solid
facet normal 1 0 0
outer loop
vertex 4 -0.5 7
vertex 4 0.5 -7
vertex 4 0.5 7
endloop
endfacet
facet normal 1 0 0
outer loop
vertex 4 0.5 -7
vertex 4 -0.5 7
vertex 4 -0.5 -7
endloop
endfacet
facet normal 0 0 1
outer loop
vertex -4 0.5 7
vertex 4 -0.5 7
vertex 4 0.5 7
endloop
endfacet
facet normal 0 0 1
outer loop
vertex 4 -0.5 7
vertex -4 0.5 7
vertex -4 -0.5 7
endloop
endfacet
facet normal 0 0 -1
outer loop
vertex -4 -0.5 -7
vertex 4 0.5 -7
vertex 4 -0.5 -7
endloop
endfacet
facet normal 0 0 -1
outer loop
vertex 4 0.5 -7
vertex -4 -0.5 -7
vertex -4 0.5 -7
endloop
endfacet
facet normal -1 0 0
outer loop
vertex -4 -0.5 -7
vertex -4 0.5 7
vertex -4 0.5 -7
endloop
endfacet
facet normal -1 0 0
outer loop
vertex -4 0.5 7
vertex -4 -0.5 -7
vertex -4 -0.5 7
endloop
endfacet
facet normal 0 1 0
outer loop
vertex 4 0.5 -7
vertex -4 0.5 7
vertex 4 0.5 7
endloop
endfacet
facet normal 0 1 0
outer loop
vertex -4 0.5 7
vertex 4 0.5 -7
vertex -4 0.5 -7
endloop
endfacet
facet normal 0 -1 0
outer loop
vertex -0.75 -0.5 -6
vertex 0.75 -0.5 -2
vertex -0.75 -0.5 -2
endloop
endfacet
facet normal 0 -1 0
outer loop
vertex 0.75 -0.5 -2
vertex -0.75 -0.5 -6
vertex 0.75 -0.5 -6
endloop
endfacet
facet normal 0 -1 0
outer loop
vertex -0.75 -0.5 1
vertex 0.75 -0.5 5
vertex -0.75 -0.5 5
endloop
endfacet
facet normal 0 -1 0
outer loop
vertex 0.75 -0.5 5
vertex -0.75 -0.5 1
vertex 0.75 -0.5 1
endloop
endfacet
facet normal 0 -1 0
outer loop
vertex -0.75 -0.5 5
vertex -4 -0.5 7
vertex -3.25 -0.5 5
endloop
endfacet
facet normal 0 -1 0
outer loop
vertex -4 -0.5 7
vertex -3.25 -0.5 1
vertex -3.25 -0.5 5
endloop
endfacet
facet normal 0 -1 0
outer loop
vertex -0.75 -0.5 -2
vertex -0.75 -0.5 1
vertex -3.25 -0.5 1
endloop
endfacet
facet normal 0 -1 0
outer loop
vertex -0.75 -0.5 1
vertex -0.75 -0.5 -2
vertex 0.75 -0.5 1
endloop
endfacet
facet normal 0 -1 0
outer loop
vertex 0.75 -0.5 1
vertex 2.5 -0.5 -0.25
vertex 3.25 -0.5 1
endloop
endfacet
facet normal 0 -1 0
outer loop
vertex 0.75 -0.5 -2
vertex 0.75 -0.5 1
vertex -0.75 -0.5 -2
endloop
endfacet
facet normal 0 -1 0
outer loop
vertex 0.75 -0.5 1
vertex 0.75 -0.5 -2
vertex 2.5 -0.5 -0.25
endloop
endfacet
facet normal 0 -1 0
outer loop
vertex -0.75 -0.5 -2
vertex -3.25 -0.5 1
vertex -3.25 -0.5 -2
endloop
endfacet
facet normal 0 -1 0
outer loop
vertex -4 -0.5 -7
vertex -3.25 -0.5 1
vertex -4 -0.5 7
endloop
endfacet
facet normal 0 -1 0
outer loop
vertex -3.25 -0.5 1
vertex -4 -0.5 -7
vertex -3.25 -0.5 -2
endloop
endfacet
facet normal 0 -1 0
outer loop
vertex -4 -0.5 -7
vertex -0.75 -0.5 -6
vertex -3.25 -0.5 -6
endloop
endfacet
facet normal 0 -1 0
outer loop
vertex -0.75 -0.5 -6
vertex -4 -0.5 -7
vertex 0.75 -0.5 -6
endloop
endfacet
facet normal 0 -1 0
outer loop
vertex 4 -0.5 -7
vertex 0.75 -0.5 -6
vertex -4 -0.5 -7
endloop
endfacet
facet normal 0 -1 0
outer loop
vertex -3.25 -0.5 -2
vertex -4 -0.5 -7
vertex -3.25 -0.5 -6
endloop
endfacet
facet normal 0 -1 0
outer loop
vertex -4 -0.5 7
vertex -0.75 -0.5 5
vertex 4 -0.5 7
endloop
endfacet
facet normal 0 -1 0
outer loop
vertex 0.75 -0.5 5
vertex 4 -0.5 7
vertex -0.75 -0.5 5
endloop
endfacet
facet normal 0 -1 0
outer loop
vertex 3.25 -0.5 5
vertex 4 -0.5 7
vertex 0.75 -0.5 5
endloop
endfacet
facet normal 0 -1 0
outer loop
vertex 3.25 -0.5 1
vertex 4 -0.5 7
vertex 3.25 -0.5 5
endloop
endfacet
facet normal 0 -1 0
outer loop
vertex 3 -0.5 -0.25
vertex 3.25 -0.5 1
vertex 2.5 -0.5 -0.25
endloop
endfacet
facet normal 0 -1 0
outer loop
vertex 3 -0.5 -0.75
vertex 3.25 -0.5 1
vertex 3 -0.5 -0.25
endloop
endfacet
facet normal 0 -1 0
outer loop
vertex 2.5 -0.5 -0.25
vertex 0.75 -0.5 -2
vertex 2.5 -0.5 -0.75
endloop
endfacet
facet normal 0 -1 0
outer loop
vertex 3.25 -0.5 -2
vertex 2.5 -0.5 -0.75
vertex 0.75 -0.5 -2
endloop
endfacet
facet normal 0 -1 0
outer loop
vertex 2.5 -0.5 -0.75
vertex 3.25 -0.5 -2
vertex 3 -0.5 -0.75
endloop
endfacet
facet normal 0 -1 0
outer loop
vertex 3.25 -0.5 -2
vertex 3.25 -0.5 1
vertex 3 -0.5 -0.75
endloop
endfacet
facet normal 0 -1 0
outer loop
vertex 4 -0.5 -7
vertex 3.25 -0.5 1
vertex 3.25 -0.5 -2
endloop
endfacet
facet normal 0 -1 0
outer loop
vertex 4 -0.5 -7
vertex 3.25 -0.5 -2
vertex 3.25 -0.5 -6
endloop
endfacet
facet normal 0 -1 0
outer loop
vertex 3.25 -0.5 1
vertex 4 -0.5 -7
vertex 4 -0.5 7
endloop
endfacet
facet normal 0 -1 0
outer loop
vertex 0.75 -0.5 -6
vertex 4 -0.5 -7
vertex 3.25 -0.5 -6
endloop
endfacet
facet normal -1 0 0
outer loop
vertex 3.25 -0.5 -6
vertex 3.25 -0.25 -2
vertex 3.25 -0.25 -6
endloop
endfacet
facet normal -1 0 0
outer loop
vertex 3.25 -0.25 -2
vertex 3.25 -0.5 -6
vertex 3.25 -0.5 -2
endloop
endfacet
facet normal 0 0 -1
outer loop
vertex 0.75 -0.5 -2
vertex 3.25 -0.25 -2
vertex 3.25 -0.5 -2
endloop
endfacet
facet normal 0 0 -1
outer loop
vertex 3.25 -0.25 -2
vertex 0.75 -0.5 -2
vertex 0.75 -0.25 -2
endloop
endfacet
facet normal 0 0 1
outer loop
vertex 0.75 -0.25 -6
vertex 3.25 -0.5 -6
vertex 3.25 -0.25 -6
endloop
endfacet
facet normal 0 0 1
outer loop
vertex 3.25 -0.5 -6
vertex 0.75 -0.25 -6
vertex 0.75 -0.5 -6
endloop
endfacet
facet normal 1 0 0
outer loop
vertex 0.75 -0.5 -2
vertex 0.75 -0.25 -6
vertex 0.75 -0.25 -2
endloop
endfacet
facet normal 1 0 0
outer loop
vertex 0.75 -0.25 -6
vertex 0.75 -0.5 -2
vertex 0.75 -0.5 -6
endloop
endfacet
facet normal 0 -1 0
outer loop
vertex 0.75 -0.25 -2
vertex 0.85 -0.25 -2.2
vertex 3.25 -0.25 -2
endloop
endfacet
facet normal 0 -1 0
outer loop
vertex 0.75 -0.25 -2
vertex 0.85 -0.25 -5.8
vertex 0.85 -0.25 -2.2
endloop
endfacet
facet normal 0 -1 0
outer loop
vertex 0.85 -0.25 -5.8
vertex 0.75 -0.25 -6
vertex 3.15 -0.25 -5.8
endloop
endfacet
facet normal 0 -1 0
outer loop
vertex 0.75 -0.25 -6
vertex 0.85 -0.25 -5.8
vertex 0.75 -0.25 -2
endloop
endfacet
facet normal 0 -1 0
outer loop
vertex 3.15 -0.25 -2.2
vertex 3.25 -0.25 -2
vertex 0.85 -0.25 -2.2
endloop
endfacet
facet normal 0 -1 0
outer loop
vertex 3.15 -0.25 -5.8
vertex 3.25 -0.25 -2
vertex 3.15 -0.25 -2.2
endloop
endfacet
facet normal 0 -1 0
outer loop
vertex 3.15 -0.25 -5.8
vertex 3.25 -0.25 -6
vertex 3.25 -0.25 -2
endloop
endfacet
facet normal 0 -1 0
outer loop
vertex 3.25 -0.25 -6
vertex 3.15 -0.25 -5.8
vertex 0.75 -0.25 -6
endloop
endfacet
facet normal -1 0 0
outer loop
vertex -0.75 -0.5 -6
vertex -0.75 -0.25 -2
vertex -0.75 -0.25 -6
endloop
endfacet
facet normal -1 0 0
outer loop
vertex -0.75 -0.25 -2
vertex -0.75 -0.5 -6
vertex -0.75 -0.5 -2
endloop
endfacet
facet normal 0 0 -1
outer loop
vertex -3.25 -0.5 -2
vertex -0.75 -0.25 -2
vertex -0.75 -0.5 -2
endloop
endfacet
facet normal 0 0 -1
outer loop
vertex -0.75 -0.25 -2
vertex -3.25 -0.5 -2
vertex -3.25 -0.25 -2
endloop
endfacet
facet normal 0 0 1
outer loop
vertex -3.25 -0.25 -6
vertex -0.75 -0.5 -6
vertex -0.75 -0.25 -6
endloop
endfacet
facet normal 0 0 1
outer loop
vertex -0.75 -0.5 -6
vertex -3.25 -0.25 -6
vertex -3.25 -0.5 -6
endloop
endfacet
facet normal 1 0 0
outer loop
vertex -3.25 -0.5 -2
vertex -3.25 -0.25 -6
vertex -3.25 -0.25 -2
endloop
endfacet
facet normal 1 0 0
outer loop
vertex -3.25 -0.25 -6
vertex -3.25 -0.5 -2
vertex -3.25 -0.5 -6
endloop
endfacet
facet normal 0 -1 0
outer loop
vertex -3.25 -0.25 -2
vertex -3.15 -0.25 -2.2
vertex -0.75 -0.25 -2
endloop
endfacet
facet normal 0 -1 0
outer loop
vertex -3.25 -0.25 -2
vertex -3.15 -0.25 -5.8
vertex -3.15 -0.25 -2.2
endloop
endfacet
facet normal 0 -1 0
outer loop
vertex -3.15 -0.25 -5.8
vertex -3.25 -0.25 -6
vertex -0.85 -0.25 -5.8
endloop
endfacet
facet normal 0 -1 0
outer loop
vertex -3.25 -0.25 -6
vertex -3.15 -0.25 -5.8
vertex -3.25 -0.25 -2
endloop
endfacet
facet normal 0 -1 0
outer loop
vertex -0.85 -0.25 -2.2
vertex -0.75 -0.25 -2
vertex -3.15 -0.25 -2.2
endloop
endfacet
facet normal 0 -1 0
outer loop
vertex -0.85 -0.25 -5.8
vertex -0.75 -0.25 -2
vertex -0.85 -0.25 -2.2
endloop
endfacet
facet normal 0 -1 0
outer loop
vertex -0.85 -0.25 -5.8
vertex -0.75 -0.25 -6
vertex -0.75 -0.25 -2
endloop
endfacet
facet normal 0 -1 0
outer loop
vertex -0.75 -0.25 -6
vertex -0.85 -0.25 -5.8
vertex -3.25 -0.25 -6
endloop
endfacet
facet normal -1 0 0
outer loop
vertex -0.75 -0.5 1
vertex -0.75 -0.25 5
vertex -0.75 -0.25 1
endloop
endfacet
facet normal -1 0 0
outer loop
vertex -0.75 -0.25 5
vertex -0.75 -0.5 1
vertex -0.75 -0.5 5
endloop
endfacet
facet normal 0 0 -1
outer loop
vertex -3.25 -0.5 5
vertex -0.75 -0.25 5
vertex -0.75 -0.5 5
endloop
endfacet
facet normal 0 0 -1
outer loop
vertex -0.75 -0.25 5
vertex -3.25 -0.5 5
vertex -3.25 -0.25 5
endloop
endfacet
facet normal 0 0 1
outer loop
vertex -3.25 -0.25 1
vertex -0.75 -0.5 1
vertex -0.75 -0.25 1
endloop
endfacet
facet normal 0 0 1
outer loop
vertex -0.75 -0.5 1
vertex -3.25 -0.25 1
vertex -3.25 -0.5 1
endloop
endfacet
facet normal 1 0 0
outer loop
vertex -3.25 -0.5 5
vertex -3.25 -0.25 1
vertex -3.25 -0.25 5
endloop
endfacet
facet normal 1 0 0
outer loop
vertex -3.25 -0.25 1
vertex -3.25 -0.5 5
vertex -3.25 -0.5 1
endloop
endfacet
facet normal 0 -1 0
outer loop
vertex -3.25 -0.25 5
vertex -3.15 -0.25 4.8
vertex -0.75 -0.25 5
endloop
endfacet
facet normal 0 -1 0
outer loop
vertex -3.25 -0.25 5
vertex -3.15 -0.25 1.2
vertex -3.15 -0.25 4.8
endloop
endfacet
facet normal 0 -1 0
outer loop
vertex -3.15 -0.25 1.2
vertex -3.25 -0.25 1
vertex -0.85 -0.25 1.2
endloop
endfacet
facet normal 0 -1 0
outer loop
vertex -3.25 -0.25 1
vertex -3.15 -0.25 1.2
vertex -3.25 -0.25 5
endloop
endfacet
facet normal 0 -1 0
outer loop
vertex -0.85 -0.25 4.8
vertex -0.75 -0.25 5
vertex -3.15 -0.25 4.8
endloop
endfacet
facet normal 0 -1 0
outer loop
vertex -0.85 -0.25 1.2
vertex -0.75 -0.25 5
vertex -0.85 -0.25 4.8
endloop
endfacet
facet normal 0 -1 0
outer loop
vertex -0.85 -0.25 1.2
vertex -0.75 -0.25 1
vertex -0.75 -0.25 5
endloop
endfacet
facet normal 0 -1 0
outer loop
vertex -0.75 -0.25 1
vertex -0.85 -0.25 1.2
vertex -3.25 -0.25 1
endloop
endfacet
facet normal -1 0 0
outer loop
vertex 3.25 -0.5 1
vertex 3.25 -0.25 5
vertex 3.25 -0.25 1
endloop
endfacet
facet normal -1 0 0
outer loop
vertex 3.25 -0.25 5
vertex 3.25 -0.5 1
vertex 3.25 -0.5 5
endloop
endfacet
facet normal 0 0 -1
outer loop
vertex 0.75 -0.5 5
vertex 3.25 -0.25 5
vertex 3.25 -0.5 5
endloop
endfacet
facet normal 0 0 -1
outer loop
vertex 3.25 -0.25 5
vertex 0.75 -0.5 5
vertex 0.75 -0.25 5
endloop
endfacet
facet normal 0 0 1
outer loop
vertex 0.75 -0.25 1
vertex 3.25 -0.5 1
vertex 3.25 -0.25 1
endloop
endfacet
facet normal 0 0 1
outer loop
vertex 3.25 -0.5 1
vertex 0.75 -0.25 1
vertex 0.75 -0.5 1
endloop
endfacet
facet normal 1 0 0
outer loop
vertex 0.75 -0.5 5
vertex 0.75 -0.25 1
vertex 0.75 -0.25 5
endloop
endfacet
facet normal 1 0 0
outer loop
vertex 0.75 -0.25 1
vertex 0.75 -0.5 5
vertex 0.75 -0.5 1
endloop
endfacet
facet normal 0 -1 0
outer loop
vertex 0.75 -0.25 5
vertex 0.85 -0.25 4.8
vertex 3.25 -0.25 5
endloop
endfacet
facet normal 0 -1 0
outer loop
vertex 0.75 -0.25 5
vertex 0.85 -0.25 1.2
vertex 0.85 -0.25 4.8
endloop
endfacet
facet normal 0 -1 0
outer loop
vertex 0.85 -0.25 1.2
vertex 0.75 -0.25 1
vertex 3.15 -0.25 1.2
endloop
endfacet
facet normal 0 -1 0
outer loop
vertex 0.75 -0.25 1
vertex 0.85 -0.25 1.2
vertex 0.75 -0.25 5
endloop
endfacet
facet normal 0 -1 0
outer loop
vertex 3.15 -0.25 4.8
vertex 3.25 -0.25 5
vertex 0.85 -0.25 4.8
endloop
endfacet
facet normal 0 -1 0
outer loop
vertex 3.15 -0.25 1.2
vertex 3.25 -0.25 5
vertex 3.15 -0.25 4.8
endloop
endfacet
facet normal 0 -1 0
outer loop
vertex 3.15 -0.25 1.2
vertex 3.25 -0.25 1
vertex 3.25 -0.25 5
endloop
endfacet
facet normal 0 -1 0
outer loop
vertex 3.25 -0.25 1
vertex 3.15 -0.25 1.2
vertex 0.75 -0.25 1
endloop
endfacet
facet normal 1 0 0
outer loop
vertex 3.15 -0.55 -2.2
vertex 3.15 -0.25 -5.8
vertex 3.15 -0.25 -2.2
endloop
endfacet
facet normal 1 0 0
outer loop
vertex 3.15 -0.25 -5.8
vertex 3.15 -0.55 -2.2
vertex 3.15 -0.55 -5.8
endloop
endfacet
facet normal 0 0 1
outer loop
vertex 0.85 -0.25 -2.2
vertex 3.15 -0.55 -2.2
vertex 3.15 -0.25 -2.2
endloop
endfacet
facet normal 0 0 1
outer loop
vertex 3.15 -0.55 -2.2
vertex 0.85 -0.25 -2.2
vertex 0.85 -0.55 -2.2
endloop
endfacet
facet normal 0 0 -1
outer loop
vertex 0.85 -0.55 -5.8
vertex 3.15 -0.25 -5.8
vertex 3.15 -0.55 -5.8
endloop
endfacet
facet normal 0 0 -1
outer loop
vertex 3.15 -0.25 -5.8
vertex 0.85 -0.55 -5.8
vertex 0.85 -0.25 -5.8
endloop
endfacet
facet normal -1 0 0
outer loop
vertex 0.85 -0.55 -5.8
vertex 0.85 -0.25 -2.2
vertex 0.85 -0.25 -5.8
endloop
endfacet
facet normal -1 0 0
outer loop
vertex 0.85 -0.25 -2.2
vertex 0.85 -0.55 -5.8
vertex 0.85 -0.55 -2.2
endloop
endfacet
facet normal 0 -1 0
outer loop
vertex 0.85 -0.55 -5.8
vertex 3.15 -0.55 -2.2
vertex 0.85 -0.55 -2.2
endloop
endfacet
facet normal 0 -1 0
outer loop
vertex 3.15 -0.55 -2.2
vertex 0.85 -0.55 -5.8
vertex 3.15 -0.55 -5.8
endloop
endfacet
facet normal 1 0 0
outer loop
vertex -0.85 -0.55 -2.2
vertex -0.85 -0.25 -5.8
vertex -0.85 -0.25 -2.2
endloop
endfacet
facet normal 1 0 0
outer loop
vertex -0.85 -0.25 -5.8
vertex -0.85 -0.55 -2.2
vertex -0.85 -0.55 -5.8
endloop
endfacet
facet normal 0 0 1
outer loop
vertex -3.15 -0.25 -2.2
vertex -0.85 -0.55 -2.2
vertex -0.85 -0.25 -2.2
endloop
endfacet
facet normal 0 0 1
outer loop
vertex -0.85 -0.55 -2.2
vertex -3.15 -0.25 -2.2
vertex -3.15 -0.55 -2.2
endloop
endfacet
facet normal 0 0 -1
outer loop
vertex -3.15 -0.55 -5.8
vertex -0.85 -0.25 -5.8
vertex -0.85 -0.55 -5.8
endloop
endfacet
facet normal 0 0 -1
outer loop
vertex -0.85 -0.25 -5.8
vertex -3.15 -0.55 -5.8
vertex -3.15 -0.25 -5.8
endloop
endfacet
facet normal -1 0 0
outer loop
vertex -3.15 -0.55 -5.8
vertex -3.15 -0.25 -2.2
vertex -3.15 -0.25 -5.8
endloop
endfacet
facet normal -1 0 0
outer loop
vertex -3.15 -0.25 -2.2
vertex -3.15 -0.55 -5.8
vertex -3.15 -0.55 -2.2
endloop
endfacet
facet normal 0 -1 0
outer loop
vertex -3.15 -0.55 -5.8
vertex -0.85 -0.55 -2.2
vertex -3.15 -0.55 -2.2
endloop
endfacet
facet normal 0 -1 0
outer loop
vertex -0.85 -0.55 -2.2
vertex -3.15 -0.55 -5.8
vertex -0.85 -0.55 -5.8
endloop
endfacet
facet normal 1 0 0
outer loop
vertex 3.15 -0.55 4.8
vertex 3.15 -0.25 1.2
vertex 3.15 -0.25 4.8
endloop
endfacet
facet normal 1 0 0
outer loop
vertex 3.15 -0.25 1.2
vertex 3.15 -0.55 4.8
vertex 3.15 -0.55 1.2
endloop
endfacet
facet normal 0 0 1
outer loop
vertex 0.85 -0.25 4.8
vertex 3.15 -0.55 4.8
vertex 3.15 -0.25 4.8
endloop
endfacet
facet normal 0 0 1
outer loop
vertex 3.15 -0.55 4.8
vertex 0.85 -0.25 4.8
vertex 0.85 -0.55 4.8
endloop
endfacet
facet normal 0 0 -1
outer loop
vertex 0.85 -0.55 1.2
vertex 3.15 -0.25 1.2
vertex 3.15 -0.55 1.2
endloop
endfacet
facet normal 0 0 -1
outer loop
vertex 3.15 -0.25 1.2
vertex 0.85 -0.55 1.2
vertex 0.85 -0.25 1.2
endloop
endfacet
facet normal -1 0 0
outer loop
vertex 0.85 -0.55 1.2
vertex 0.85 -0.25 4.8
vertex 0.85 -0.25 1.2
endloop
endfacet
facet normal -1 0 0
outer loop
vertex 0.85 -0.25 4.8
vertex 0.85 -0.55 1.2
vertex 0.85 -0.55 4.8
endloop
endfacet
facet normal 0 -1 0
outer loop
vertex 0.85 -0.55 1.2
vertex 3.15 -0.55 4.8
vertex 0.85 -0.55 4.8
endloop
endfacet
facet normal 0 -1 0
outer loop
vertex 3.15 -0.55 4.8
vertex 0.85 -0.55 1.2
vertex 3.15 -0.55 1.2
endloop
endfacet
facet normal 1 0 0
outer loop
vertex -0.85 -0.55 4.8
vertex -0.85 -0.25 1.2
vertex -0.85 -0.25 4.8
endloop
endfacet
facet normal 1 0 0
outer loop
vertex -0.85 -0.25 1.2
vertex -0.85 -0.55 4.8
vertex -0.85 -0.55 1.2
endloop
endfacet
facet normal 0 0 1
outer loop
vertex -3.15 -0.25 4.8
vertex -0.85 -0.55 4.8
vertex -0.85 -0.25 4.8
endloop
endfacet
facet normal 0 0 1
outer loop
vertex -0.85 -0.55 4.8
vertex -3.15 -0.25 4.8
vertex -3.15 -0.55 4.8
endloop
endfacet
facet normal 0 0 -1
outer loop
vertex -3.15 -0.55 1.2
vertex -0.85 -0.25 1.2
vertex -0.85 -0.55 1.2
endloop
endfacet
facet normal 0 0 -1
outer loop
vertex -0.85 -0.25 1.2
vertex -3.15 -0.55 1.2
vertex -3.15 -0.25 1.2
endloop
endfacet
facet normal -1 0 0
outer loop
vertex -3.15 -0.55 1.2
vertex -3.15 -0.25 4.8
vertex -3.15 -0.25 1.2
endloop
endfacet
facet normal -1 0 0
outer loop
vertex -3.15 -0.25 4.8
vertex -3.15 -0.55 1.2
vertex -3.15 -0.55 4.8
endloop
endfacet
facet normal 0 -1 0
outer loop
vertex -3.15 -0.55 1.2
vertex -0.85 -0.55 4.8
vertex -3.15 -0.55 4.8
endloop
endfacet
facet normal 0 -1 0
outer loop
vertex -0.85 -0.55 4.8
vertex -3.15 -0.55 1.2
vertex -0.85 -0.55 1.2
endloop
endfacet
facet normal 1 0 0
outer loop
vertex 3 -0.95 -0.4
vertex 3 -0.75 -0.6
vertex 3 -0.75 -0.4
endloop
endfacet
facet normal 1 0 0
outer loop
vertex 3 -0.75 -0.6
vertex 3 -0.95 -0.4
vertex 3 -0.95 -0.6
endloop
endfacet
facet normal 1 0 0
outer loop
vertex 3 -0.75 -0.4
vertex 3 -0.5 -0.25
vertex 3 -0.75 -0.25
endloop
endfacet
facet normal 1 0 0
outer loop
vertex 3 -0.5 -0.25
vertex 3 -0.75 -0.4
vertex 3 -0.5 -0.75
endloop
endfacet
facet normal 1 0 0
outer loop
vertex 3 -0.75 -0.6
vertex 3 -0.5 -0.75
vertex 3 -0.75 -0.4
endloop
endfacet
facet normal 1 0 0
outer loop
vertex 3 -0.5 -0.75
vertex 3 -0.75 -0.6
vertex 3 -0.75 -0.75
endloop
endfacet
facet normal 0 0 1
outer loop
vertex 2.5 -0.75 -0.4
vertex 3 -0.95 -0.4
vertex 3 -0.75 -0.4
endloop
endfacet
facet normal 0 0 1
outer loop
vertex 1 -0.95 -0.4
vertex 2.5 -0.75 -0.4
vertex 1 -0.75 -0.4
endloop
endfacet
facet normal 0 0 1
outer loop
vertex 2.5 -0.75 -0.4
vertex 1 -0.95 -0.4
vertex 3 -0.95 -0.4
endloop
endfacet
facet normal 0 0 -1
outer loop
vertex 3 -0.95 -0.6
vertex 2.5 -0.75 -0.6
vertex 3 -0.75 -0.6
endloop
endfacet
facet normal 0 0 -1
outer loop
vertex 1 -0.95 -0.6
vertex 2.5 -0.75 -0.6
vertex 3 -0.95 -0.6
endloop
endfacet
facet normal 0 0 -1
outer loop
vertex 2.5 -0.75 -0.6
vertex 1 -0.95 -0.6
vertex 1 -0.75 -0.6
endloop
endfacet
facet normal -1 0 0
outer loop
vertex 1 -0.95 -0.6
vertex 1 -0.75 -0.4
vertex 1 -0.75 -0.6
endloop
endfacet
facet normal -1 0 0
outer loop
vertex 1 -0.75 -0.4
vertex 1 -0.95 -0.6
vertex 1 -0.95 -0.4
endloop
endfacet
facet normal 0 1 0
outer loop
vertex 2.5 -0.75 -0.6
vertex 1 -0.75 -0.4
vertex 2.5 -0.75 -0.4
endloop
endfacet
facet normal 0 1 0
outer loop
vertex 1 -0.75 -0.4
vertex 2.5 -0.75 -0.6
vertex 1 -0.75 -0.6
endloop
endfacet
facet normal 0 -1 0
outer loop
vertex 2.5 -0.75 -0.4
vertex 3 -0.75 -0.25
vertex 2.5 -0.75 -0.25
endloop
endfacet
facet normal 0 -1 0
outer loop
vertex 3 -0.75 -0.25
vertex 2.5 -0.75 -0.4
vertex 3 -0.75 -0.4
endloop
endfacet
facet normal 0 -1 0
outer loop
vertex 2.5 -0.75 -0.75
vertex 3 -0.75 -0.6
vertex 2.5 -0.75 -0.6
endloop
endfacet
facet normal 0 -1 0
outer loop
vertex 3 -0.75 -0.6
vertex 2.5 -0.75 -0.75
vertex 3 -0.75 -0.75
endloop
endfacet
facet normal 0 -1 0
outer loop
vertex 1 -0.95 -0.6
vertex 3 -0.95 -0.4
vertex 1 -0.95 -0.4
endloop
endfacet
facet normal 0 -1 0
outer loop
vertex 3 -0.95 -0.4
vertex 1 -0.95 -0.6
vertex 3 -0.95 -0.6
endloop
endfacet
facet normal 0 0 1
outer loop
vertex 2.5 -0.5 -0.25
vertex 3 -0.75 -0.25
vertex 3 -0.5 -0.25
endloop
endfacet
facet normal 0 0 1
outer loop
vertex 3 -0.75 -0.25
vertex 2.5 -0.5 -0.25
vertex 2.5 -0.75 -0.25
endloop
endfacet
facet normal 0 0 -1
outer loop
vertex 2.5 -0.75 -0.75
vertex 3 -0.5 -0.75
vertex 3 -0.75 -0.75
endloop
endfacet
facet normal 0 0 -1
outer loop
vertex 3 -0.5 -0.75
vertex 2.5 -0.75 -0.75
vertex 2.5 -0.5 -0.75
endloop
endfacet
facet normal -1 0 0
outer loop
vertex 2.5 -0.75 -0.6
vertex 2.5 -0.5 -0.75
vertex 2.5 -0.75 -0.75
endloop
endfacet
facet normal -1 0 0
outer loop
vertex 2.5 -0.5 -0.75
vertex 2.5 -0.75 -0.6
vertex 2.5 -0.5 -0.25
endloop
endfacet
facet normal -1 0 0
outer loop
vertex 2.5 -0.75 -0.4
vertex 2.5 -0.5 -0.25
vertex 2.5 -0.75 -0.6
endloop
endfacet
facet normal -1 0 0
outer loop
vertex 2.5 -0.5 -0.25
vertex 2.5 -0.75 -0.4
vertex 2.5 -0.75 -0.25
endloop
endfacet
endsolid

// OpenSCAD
module Door_01(){
    difference(){
        color("#664433")
        cube([8,1,14], center = true );

        color("#553311")
        translate([2,-1,-4])
        color("#664433")
        cube([2.5,1.5,4], center = true );

        color("#553311")
        translate([-2,-1,-4])
        color("#664433")
        cube([2.5,1.5,4], center = true );

        color("#553311")
        translate([-2,-1,3])
        color("#664433")
        cube([2.5,1.5,4], center = true );
         
        color("#553311"){
        translate([2,-1,3])
        cube([2.5,1.5,4], center = true );
        }

    }

    color("#664433")
    translate([2,-0.3,-4])
    cube([2.3,0.5,3.6], center = true);

    color("#664433")
    translate([-2,-0.3,-4])
    cube([2.3,0.5,3.6], center = true);

    color("#664433")
    translate([2,-0.3,3])
    cube([2.3,0.5,3.6], center = true);

    color("#664433")
    translate([-2,-0.3,3])
    cube([2.3,0.5,3.6], center = true);

    color("#ada192")
    translate([2,-0.85,-0.5])
    
    color("#664433")
    cube([2,0.2,0.2], center = true );
    
    color("#ada192")
    translate([2.75,-0.5,-0.5])
    cube([0.5,0.5,0.5], center = true );

}


Door_01();

// Written by Nicolì Angelo (Gengio) 2024: 
// MIT License

//Permission is hereby granted, free of charge, to any person obtaining a copy of this software and associated documentation files (the "Software"), to deal in the Software without restriction, including without limitation the rights to use, copy, modify, merge, publish, distribute, sublicense, and/or sell copies of the Software, and to permit persons to whom the Software is furnished to do so, subject to the following conditions:

//The above copyright notice and this permission notice shall be included in all copies or substantial portions of the Software.

//THE SOFTWARE IS PROVIDED "AS IS", WITHOUT WARRANTY OF ANY KIND, EXPRESS OR IMPLIED, INCLUDING BUT NOT LIMITED TO THE WARRANTIES OF MERCHANTABILITY, FITNESS FOR A PARTICULAR PURPOSE AND NONINFRINGEMENT. IN NO EVENT SHALL THE AUTHORS OR COPYRIGHT HOLDERS BE LIABLE FOR ANY CLAIM, DAMAGES OR OTHER LIABILITY, WHETHER IN AN ACTION OF CONTRACT, TORT OR OTHERWISE, ARISING FROM, OUT OF OR IN CONNECTION WITH THE SOFTWARE OR THE USE OR OTHER DEALINGS IN THE SOFTWARE.
